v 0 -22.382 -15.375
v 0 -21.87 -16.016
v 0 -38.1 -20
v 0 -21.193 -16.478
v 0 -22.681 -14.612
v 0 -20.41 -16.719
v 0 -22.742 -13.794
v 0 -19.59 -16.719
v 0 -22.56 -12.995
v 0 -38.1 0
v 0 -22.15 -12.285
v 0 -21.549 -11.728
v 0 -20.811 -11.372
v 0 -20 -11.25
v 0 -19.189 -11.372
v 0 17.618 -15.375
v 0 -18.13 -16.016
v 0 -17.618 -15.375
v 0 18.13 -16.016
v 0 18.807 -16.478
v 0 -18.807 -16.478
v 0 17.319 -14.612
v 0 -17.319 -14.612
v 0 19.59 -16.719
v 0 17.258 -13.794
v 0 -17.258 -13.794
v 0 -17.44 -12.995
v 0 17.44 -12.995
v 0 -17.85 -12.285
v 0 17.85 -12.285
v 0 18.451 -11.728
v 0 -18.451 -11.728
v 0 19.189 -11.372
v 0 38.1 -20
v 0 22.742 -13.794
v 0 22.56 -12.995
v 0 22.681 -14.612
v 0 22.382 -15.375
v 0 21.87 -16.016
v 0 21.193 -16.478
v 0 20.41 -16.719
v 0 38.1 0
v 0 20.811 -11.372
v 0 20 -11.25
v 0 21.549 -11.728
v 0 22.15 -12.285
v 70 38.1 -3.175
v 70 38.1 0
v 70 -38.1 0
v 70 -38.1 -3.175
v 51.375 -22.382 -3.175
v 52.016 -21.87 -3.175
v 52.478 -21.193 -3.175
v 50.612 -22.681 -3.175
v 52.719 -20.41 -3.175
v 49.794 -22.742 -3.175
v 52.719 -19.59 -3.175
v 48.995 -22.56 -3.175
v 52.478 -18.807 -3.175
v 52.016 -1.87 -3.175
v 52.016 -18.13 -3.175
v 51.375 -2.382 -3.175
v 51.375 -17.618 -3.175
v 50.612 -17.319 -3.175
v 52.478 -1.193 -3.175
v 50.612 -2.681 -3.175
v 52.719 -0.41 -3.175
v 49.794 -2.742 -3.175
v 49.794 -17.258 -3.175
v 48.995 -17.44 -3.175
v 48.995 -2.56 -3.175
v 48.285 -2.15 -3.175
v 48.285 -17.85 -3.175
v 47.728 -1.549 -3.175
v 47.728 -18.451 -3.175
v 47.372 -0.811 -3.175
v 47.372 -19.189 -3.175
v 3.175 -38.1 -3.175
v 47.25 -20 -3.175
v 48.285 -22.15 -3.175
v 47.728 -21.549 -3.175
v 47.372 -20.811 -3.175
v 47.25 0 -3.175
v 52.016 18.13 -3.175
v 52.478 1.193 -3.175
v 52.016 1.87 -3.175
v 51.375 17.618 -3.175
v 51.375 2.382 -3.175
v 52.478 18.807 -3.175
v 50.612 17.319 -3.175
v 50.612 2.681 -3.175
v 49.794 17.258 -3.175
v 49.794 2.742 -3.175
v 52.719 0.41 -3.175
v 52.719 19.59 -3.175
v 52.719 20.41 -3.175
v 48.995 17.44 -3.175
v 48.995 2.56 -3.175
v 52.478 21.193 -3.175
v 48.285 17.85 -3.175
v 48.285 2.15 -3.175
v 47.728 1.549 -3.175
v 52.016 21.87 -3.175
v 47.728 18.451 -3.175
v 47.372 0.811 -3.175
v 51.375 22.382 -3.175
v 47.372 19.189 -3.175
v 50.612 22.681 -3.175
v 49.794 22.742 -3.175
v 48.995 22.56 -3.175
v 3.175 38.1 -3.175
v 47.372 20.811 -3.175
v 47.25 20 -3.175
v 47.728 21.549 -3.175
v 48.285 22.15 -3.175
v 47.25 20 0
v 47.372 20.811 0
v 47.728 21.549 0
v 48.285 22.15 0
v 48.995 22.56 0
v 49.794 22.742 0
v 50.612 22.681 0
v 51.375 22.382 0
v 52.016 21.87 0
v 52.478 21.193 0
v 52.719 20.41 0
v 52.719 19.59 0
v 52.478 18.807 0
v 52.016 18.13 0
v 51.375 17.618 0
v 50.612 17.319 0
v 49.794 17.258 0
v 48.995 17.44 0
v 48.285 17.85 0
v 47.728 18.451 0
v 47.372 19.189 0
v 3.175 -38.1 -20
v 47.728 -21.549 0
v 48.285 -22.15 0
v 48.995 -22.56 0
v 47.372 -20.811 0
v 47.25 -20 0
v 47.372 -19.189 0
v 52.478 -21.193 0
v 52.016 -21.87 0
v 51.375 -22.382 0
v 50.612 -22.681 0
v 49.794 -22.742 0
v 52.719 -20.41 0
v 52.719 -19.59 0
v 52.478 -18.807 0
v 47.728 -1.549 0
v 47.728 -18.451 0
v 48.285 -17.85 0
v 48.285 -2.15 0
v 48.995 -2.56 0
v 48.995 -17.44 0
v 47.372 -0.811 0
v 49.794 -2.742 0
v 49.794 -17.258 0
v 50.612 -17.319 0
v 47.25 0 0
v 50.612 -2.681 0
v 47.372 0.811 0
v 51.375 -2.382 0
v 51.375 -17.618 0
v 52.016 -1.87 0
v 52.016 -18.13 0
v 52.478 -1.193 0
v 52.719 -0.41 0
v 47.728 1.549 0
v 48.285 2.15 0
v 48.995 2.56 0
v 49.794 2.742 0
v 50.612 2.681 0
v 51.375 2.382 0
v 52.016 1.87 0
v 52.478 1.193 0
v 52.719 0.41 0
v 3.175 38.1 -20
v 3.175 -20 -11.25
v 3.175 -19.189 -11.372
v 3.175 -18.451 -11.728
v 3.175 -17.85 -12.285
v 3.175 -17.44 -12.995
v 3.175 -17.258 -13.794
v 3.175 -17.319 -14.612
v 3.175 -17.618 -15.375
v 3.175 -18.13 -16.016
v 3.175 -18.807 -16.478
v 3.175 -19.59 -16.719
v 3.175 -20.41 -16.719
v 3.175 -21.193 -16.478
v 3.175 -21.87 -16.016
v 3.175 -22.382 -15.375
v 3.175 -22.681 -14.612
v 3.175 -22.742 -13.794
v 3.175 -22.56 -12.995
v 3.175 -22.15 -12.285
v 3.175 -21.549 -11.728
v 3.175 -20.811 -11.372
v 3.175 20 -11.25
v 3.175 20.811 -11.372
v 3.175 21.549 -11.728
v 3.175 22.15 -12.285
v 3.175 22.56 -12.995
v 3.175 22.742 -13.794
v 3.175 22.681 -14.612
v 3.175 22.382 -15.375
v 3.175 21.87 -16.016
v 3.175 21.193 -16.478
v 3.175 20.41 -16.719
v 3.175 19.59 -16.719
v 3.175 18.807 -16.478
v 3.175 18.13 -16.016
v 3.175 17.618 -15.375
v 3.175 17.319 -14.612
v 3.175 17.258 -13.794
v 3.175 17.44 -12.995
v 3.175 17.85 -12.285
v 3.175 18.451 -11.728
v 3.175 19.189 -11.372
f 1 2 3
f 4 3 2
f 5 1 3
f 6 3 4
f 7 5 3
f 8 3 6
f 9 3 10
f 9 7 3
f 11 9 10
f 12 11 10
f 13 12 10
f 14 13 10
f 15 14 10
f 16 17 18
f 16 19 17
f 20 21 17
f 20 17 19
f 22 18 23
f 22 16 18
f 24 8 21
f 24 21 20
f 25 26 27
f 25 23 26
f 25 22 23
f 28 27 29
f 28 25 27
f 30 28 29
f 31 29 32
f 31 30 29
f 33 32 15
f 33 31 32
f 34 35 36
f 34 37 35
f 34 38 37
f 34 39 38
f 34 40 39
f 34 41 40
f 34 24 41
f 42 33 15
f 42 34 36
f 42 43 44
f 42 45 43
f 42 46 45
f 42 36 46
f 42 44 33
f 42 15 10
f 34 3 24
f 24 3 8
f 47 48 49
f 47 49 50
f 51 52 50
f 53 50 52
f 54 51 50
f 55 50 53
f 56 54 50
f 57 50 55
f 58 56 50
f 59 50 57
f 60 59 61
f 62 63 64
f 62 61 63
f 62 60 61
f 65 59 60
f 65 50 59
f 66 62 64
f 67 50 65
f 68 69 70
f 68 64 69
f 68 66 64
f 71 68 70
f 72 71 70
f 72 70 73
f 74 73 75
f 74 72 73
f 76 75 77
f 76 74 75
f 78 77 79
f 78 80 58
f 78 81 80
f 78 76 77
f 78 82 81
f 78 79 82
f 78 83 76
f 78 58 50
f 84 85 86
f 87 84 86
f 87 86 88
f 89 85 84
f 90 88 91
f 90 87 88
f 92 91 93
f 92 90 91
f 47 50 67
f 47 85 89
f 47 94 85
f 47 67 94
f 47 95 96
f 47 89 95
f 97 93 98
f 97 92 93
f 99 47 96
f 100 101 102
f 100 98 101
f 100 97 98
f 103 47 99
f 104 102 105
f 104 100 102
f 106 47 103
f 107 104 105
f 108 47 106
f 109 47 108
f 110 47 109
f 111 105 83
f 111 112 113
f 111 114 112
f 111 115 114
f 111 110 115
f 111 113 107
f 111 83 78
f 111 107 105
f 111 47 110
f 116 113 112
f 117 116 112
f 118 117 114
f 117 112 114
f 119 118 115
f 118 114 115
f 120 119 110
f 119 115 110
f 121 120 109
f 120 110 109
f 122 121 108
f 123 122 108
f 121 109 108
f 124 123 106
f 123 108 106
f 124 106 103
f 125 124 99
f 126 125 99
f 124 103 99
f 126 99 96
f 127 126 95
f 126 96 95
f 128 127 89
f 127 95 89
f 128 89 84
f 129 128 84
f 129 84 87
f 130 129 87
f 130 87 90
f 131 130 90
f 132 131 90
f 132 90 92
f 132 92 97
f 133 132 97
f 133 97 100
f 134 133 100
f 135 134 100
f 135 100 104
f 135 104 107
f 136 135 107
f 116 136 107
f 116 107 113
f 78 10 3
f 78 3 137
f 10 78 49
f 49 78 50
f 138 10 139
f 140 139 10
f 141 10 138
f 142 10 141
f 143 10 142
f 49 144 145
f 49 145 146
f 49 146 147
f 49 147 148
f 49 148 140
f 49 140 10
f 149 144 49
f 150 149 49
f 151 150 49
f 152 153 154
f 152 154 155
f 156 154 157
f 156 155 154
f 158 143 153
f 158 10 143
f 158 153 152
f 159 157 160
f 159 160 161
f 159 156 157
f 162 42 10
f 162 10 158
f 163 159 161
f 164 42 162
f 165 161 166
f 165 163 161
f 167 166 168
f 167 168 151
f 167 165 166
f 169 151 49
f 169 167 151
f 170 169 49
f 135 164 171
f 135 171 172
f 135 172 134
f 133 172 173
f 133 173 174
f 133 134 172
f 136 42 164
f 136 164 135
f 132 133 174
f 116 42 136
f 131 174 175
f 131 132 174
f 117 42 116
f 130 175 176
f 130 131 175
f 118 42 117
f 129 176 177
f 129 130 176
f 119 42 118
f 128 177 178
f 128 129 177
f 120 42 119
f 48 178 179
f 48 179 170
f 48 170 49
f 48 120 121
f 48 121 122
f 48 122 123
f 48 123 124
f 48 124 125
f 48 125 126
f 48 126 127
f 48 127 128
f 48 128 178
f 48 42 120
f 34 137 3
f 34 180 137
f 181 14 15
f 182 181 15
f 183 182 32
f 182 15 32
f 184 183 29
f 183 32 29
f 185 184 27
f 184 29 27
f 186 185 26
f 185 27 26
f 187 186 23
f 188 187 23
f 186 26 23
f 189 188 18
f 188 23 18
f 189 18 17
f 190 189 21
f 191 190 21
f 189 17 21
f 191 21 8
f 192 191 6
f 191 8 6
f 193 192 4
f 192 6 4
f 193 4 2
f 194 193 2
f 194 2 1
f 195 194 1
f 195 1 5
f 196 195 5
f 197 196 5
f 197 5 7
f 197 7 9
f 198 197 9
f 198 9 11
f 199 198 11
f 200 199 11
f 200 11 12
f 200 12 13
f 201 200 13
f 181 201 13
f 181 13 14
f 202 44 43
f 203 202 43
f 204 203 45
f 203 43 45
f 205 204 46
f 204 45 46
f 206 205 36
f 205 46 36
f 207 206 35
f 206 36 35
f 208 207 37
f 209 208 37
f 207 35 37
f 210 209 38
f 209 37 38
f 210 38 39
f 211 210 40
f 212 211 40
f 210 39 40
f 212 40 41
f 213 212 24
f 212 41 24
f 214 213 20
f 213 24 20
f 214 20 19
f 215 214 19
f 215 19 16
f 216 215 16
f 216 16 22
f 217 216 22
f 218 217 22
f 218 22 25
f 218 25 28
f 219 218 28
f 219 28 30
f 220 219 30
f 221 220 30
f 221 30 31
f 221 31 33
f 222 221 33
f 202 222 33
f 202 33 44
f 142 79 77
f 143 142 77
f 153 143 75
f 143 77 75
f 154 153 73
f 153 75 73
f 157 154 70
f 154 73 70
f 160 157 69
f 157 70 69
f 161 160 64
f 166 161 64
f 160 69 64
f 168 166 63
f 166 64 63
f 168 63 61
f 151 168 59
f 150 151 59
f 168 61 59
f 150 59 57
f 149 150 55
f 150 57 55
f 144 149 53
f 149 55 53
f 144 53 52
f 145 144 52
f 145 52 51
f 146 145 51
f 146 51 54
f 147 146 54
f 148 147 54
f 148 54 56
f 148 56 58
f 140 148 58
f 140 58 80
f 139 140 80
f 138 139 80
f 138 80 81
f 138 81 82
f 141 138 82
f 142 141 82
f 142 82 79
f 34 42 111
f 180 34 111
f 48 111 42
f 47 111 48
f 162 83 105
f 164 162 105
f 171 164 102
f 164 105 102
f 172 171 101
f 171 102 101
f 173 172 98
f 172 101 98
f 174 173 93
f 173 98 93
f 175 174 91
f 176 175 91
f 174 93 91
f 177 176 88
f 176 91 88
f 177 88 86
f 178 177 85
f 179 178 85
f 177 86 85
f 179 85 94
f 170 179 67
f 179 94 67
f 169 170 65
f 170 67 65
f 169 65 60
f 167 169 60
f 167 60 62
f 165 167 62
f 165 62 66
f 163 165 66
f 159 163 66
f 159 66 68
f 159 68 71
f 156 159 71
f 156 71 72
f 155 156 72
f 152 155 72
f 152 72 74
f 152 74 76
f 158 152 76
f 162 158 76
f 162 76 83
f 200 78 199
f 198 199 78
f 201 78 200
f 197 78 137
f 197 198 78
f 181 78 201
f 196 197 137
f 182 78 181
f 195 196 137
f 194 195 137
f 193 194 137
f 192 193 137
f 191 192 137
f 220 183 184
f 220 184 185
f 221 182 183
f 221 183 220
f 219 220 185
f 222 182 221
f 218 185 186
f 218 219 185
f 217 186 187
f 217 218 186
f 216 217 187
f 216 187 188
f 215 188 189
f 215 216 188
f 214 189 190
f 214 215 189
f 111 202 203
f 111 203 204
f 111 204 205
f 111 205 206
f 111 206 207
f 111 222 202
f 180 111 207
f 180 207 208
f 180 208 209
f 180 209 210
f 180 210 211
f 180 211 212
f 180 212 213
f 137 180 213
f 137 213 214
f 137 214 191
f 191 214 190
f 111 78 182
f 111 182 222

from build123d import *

# Parameters (mm, degrees)
EXTRUDE_THIN1_DEPTH  = 38.1
M5_CLEARANCE_HOLE1_D = 5.5
M5_CLEARANCE_HOLE2_D = 5.5


with BuildPart() as part:
    # Sketch1 → Extrude-Thin1 (new body, symmetric)
    with BuildSketch(Plane(origin=(0, 0, 0), x_dir=(1, 0, 0), z_dir=(0, 1, 0))):
        Polygon((0, 20), (0, 0), (70, 0), (70, 3.175), (3.175, 3.175), (3.175, 20), align=None)
    extrude(amount=EXTRUDE_THIN1_DEPTH, both=True)

    # M5 Clearance Hole1 (through all)
    with Locations(Plane.XY):
        with Locations((50, 20), (50, 0), (50, -20)):
            Hole(M5_CLEARANCE_HOLE1_D / 2)

    # M5 Clearance Hole2 (through all)
    with Locations(Plane(origin=(3.175, 0, 0), x_dir=(0, 0, -1), z_dir=(1, 0, 0))):
        with Locations((14, 20), (14, -20)):
            Hole(M5_CLEARANCE_HOLE2_D / 2)


solid = part.part
